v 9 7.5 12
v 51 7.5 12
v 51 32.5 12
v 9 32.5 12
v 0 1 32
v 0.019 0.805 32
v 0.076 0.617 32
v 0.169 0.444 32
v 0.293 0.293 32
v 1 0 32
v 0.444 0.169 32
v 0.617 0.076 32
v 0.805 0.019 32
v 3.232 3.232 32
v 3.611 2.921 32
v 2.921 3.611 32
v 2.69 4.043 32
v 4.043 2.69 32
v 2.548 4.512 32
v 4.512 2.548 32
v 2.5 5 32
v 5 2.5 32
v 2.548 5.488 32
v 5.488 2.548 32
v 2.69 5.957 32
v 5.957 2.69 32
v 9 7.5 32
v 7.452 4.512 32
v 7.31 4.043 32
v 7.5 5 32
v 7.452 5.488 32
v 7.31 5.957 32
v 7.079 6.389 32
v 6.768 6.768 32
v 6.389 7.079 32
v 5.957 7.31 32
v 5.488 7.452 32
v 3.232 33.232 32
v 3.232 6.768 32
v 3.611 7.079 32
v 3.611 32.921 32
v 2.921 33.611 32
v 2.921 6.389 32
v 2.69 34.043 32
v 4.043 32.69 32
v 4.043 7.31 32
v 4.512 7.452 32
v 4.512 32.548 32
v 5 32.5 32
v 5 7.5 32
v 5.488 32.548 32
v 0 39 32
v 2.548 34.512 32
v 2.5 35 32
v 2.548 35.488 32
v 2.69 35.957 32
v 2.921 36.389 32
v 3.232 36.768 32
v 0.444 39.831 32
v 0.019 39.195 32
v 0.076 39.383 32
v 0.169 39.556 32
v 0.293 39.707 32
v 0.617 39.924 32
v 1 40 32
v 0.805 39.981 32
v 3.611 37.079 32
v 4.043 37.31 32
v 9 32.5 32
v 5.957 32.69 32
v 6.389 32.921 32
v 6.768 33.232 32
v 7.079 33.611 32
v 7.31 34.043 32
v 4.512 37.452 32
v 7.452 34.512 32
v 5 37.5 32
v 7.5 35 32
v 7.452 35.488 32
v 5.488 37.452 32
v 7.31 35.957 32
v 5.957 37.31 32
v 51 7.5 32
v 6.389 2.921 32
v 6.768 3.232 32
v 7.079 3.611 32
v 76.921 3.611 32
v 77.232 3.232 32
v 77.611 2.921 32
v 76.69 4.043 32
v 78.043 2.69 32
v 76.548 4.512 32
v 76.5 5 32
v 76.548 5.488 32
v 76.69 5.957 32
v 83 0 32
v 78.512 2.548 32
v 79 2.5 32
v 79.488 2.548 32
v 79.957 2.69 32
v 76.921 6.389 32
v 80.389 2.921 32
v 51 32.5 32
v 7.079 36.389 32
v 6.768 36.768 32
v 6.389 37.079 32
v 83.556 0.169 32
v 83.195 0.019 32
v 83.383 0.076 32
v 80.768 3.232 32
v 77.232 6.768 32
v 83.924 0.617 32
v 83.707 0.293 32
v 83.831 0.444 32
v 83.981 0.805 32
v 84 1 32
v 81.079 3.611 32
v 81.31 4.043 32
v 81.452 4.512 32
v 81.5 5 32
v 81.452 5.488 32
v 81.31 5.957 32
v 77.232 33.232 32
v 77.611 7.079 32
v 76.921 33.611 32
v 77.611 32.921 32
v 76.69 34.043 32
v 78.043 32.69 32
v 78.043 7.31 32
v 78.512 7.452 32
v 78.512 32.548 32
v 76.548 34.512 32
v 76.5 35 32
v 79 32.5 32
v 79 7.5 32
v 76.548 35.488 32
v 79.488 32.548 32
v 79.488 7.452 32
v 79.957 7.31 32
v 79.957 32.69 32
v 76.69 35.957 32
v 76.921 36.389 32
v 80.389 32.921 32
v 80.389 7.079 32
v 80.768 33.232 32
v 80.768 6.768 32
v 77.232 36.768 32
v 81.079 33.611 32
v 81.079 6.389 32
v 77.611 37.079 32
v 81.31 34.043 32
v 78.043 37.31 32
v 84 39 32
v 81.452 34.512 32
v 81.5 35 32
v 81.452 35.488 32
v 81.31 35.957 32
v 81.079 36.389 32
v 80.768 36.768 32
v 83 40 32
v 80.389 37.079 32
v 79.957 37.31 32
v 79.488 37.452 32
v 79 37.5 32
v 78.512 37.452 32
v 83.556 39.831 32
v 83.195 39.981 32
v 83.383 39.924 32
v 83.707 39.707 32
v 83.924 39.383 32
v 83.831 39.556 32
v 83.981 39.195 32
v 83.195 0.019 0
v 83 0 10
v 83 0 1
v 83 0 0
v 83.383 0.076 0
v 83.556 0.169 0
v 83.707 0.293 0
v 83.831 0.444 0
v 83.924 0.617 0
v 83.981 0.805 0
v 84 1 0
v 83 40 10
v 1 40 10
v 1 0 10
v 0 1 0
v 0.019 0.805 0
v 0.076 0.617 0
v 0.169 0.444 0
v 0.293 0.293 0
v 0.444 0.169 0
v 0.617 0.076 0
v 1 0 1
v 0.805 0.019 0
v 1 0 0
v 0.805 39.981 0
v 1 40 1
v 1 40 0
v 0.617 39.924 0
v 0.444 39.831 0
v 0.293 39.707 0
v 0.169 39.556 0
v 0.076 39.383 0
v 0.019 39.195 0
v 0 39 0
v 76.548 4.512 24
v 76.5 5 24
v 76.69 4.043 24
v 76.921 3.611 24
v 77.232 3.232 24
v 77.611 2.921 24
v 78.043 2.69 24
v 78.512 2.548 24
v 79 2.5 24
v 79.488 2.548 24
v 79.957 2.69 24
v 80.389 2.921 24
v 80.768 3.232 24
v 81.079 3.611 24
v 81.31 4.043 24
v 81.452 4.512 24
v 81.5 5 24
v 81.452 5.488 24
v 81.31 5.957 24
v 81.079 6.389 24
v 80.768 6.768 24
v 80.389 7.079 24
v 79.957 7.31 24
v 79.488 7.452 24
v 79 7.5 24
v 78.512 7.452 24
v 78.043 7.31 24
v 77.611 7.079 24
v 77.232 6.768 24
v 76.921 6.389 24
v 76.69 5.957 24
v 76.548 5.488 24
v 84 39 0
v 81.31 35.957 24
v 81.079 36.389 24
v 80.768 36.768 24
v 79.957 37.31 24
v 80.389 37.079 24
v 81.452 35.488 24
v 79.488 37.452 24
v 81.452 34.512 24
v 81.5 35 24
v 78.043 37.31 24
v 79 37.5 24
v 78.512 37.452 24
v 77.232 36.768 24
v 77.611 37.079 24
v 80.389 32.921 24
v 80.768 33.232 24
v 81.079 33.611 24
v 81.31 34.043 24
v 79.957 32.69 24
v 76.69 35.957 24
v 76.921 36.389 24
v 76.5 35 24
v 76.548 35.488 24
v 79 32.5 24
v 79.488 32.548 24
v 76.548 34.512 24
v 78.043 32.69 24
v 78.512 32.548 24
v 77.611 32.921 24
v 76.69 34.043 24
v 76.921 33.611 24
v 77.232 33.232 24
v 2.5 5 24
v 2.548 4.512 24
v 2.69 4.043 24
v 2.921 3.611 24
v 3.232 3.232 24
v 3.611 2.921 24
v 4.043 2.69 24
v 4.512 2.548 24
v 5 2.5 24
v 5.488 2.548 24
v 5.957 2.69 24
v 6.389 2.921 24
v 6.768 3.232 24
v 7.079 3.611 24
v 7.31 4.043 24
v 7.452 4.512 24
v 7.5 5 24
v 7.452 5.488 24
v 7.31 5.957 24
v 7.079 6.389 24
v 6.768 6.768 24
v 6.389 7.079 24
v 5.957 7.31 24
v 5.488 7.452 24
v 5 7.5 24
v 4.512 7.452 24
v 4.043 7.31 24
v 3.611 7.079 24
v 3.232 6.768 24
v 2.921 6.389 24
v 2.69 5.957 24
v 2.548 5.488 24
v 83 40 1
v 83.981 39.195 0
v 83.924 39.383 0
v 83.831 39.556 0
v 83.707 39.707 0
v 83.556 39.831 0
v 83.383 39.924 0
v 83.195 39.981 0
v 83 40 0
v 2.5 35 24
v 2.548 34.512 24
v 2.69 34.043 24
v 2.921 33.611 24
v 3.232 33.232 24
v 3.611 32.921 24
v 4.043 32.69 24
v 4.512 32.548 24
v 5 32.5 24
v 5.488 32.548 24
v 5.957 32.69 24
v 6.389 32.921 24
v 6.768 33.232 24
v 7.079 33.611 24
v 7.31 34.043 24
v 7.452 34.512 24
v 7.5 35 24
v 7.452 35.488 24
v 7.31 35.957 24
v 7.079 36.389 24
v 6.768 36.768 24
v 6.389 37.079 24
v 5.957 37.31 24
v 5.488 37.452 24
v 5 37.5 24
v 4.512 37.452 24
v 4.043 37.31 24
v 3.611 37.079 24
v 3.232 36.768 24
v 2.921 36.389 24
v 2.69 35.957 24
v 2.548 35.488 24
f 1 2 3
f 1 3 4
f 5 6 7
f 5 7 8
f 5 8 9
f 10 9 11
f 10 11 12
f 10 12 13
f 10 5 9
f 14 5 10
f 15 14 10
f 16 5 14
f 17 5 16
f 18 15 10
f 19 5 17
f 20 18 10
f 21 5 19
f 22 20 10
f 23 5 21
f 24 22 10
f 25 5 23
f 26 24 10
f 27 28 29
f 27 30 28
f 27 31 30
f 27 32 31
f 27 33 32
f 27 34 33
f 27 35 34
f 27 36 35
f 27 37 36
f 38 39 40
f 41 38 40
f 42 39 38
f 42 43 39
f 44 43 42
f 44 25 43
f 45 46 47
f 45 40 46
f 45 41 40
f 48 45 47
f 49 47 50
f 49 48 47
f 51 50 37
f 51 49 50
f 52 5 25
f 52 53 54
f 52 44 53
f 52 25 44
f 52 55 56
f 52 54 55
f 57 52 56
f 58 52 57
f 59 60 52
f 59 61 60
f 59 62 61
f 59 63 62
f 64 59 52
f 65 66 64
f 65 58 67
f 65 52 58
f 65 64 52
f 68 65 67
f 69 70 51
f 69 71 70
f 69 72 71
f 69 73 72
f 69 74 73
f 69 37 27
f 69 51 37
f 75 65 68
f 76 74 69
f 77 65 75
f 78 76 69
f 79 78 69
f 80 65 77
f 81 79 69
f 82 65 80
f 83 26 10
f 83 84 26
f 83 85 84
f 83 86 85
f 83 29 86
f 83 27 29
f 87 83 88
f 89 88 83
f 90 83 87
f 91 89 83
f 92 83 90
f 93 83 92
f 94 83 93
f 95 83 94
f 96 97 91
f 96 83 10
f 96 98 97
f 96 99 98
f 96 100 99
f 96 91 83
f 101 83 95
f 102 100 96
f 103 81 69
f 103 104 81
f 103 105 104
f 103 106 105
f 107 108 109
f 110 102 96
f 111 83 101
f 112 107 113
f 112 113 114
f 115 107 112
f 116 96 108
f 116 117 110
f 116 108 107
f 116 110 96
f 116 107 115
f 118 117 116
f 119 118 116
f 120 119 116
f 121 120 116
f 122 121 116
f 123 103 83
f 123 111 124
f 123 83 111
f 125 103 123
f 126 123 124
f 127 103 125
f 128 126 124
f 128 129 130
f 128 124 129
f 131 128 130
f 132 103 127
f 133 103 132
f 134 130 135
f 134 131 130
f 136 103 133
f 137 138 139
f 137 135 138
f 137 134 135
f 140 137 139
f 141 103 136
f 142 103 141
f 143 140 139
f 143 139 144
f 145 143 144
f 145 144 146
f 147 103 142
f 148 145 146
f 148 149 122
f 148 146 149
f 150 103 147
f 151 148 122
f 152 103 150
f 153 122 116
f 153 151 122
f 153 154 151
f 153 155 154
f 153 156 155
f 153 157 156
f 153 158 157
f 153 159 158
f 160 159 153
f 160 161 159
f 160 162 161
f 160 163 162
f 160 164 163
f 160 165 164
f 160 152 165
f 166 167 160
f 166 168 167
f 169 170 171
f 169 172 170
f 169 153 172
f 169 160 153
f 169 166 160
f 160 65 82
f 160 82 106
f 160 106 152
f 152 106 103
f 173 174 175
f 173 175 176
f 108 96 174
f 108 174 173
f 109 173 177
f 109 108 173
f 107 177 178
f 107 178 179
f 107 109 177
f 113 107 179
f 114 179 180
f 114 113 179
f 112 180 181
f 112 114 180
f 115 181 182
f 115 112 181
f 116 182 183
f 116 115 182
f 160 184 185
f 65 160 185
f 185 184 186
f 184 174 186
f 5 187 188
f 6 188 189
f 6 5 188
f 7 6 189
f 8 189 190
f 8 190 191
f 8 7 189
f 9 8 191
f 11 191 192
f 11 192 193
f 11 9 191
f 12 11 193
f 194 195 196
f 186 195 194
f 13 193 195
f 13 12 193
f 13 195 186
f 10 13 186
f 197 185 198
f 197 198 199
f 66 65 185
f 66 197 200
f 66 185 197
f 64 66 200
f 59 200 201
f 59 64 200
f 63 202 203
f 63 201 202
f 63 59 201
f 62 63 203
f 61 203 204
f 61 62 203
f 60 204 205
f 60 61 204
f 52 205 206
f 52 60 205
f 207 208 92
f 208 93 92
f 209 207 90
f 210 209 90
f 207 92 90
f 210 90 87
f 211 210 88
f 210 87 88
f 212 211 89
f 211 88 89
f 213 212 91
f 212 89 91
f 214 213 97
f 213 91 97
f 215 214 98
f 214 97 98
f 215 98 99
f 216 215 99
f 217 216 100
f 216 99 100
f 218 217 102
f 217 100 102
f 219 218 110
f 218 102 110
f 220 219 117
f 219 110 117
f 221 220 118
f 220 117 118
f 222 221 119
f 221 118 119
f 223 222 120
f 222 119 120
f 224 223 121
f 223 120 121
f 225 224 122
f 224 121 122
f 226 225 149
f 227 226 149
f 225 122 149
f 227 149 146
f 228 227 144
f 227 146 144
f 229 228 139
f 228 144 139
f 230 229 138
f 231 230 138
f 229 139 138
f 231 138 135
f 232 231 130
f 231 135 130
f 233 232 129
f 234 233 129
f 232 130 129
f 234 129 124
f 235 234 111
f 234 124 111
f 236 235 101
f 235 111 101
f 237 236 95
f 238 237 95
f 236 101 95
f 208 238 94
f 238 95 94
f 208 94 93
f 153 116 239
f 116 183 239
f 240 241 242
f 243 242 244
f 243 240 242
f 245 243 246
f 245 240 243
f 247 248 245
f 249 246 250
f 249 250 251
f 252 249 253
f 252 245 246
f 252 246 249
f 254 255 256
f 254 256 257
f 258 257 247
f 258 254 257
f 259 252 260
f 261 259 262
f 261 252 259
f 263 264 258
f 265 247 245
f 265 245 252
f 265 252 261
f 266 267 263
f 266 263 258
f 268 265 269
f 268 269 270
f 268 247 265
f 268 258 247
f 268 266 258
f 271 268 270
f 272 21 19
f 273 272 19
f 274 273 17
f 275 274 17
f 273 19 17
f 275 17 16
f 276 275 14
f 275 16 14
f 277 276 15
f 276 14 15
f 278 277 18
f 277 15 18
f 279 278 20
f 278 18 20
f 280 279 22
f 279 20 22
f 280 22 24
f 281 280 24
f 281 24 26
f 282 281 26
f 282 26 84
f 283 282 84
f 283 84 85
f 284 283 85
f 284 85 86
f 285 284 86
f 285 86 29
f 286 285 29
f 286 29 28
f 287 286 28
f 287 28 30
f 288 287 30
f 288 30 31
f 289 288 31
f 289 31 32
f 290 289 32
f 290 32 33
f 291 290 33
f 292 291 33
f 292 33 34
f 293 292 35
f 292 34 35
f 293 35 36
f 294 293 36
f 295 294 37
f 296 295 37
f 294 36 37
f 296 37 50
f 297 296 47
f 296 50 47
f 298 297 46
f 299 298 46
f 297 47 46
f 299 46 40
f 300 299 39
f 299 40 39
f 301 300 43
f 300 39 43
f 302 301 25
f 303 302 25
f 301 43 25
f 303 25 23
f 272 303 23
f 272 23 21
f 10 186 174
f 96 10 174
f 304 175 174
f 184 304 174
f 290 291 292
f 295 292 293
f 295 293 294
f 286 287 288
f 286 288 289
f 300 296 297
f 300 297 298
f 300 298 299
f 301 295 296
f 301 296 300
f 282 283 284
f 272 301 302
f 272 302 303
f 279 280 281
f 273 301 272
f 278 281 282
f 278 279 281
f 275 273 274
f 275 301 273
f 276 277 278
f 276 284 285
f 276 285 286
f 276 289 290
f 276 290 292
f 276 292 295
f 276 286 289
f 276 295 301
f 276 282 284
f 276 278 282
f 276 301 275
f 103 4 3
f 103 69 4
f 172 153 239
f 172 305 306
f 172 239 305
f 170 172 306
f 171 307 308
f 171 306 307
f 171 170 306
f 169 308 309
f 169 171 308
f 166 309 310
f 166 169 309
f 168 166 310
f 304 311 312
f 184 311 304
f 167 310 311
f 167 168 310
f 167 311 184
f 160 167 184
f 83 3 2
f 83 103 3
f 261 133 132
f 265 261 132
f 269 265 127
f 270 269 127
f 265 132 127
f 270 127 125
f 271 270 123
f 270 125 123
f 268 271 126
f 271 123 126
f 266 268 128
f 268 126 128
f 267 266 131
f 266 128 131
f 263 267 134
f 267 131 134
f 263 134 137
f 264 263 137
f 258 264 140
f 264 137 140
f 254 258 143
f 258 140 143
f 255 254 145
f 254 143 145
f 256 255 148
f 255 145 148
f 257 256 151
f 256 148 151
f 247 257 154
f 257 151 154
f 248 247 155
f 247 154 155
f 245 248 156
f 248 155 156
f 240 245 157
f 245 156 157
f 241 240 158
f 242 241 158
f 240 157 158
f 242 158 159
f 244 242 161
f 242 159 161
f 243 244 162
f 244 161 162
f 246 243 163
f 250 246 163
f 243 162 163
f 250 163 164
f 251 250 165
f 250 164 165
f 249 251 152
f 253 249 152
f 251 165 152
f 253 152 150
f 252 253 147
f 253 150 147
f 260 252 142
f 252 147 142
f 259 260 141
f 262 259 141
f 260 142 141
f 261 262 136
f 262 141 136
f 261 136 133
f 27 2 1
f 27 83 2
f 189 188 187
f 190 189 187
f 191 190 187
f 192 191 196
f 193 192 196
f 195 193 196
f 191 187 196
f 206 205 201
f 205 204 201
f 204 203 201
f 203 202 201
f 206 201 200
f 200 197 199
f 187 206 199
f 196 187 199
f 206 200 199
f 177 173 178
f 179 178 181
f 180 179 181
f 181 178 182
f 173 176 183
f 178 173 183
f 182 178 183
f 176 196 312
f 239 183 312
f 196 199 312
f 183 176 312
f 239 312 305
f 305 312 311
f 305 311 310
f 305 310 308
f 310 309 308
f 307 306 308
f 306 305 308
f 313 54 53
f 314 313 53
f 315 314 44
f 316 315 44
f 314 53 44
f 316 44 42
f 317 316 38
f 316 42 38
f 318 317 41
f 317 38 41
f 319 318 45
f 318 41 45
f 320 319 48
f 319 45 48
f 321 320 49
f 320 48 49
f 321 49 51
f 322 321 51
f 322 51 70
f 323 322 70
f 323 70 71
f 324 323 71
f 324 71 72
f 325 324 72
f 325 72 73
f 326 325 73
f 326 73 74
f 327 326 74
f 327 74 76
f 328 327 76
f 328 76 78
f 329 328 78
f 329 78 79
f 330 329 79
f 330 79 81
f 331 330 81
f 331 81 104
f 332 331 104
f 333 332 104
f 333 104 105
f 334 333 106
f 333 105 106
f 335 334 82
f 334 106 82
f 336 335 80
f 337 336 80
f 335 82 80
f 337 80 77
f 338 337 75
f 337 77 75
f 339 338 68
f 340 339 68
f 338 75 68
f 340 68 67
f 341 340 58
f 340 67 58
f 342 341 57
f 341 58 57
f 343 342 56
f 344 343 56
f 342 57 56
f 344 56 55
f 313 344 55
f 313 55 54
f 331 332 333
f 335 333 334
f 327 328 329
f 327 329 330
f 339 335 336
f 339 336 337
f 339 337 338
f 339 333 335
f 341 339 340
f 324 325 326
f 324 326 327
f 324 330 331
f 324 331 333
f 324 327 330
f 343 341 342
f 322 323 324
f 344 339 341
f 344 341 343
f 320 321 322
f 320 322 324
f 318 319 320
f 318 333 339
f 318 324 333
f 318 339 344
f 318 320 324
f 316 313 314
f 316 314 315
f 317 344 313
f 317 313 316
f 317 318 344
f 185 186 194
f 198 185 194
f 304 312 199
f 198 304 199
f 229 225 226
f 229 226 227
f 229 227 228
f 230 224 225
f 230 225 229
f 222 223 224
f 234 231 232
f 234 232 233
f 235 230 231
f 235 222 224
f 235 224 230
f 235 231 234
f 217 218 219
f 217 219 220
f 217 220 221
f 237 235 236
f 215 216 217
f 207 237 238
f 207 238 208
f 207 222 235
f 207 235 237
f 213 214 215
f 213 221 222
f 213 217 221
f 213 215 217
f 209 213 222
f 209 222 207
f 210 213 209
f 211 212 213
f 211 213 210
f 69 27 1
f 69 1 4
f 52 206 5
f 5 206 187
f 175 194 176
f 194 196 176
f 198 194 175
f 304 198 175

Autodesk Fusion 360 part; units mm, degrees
sketch "スケッチ1" plane through (0, 0, 0) normal (0, 0, 1) x (1, 0, 0)
  line L0 (0, 0) -> (84, 0)
  line L1 (84, 0) -> (84, 40)
  line L2 (84, 40) -> (0, 40)
  line L3 (0, 40) -> (0, 0)
  dimension "d1" = 40
  dimension "d2" = 84
extrude "押し出し1" add sketch "スケッチ1" along normal blind 32
sketch "スケッチ2" plane through (0, 0, 32) normal (0, 0, 1) x (-1, 0, 0)
  line L0 (0, -40) -> (0, 0)
  line L1 (0, 0) -> (-84, 0)
  line L2 (-84, 0) -> (-84, -40)
  line L3 (-84, -40) -> (0, -40)
  line L4 (-9, -32.5) -> (-51, -32.5)
  line L5 (-51, -32.5) -> (-51, -7.5)
  line L6 (-51, -7.5) -> (-9, -7.5)
  line L7 (-9, -7.5) -> (-9, -32.5)
  dimension "d5" = 42
  dimension "d6" = 25
  dimension "d27" = 9
  dimension "d72" = 7.5
extrude "押し出し2" cut sketch "スケッチ2" against normal blind 20 contours L4 L5 L6 L7
fillet "フィレット1" radius 1 4 edges at (84, 0, 16) (84, 40, 16) (0, 0, 16) (0, 40, 16)
sketch "スケッチ5" plane through (0, 0, 32) normal (0, 0, 1) x (-1, 0, 0)
  arc A0 (-1, -40) -> (0, -39) centre (-1, -39) ccw
  line L0 (0, -39) -> (0, -1)
  arc A1 (0, -1) -> (-1, 0) centre (-1, -1) ccw
  line L1 (-1, 0) -> (-83, 0)
  arc A2 (-83, 0) -> (-84, -1) centre (-83, -1) ccw
  line L2 (-84, -1) -> (-84, -39)
  arc A3 (-84, -39) -> (-83, -40) centre (-83, -39) ccw
  line L3 (-83, -40) -> (-1, -40)
  line L4 (-51, -32.5) -> (-51, -7.5)
  line L5 (-51, -7.5) -> (-9, -7.5)
  line L6 (-9, -7.5) -> (-9, -32.5)
  line L7 (-9, -32.5) -> (-51, -32.5)
  circle A4 centre (-5, -5) radius 2.5
  circle A5 centre (-5, -35) radius 2.5
  circle A6 centre (-79, -5) radius 2.5
  circle A7 centre (-79, -35) radius 2.5
  dimension "d28" = 5
  dimension "d29" = 5
  dimension "d30" = 5
  dimension "d31" = 5
  dimension "d32" = 5
  dimension "d33" = 5
  dimension "d34" = 5
  dimension "d35" = 5
  dimension "d36" = 5
  dimension "d37" = 5
  dimension "d38" = 5
  dimension "d39" = 5
extrude "押し出し4" cut sketch "スケッチ5" against normal blind 8 contours A4 | A5 | A6 | A7
sketch "スケッチ18" plane through (0, 0, 0) normal (0, -1, 0) x (1, 0, 0)
  line L0 (1, 32) -> (1, 0)
  line L1 (1, 0) -> (83, 0)
  line L2 (83, 0) -> (83, 32)
  line L3 (83, 32) -> (1, 32)
  line L4 (1, 1) -> (83, 1)
  line L5 (83, 1) -> (83, 10)
  line L6 (83, 10) -> (1, 10)
  line L7 (1, 10) -> (1, 1)
  dimension "d75" = 9
extrude "押し出し16" cut sketch "スケッチ18" against normal blind 40 contours L0 L2 L4 L5 L6 L7
